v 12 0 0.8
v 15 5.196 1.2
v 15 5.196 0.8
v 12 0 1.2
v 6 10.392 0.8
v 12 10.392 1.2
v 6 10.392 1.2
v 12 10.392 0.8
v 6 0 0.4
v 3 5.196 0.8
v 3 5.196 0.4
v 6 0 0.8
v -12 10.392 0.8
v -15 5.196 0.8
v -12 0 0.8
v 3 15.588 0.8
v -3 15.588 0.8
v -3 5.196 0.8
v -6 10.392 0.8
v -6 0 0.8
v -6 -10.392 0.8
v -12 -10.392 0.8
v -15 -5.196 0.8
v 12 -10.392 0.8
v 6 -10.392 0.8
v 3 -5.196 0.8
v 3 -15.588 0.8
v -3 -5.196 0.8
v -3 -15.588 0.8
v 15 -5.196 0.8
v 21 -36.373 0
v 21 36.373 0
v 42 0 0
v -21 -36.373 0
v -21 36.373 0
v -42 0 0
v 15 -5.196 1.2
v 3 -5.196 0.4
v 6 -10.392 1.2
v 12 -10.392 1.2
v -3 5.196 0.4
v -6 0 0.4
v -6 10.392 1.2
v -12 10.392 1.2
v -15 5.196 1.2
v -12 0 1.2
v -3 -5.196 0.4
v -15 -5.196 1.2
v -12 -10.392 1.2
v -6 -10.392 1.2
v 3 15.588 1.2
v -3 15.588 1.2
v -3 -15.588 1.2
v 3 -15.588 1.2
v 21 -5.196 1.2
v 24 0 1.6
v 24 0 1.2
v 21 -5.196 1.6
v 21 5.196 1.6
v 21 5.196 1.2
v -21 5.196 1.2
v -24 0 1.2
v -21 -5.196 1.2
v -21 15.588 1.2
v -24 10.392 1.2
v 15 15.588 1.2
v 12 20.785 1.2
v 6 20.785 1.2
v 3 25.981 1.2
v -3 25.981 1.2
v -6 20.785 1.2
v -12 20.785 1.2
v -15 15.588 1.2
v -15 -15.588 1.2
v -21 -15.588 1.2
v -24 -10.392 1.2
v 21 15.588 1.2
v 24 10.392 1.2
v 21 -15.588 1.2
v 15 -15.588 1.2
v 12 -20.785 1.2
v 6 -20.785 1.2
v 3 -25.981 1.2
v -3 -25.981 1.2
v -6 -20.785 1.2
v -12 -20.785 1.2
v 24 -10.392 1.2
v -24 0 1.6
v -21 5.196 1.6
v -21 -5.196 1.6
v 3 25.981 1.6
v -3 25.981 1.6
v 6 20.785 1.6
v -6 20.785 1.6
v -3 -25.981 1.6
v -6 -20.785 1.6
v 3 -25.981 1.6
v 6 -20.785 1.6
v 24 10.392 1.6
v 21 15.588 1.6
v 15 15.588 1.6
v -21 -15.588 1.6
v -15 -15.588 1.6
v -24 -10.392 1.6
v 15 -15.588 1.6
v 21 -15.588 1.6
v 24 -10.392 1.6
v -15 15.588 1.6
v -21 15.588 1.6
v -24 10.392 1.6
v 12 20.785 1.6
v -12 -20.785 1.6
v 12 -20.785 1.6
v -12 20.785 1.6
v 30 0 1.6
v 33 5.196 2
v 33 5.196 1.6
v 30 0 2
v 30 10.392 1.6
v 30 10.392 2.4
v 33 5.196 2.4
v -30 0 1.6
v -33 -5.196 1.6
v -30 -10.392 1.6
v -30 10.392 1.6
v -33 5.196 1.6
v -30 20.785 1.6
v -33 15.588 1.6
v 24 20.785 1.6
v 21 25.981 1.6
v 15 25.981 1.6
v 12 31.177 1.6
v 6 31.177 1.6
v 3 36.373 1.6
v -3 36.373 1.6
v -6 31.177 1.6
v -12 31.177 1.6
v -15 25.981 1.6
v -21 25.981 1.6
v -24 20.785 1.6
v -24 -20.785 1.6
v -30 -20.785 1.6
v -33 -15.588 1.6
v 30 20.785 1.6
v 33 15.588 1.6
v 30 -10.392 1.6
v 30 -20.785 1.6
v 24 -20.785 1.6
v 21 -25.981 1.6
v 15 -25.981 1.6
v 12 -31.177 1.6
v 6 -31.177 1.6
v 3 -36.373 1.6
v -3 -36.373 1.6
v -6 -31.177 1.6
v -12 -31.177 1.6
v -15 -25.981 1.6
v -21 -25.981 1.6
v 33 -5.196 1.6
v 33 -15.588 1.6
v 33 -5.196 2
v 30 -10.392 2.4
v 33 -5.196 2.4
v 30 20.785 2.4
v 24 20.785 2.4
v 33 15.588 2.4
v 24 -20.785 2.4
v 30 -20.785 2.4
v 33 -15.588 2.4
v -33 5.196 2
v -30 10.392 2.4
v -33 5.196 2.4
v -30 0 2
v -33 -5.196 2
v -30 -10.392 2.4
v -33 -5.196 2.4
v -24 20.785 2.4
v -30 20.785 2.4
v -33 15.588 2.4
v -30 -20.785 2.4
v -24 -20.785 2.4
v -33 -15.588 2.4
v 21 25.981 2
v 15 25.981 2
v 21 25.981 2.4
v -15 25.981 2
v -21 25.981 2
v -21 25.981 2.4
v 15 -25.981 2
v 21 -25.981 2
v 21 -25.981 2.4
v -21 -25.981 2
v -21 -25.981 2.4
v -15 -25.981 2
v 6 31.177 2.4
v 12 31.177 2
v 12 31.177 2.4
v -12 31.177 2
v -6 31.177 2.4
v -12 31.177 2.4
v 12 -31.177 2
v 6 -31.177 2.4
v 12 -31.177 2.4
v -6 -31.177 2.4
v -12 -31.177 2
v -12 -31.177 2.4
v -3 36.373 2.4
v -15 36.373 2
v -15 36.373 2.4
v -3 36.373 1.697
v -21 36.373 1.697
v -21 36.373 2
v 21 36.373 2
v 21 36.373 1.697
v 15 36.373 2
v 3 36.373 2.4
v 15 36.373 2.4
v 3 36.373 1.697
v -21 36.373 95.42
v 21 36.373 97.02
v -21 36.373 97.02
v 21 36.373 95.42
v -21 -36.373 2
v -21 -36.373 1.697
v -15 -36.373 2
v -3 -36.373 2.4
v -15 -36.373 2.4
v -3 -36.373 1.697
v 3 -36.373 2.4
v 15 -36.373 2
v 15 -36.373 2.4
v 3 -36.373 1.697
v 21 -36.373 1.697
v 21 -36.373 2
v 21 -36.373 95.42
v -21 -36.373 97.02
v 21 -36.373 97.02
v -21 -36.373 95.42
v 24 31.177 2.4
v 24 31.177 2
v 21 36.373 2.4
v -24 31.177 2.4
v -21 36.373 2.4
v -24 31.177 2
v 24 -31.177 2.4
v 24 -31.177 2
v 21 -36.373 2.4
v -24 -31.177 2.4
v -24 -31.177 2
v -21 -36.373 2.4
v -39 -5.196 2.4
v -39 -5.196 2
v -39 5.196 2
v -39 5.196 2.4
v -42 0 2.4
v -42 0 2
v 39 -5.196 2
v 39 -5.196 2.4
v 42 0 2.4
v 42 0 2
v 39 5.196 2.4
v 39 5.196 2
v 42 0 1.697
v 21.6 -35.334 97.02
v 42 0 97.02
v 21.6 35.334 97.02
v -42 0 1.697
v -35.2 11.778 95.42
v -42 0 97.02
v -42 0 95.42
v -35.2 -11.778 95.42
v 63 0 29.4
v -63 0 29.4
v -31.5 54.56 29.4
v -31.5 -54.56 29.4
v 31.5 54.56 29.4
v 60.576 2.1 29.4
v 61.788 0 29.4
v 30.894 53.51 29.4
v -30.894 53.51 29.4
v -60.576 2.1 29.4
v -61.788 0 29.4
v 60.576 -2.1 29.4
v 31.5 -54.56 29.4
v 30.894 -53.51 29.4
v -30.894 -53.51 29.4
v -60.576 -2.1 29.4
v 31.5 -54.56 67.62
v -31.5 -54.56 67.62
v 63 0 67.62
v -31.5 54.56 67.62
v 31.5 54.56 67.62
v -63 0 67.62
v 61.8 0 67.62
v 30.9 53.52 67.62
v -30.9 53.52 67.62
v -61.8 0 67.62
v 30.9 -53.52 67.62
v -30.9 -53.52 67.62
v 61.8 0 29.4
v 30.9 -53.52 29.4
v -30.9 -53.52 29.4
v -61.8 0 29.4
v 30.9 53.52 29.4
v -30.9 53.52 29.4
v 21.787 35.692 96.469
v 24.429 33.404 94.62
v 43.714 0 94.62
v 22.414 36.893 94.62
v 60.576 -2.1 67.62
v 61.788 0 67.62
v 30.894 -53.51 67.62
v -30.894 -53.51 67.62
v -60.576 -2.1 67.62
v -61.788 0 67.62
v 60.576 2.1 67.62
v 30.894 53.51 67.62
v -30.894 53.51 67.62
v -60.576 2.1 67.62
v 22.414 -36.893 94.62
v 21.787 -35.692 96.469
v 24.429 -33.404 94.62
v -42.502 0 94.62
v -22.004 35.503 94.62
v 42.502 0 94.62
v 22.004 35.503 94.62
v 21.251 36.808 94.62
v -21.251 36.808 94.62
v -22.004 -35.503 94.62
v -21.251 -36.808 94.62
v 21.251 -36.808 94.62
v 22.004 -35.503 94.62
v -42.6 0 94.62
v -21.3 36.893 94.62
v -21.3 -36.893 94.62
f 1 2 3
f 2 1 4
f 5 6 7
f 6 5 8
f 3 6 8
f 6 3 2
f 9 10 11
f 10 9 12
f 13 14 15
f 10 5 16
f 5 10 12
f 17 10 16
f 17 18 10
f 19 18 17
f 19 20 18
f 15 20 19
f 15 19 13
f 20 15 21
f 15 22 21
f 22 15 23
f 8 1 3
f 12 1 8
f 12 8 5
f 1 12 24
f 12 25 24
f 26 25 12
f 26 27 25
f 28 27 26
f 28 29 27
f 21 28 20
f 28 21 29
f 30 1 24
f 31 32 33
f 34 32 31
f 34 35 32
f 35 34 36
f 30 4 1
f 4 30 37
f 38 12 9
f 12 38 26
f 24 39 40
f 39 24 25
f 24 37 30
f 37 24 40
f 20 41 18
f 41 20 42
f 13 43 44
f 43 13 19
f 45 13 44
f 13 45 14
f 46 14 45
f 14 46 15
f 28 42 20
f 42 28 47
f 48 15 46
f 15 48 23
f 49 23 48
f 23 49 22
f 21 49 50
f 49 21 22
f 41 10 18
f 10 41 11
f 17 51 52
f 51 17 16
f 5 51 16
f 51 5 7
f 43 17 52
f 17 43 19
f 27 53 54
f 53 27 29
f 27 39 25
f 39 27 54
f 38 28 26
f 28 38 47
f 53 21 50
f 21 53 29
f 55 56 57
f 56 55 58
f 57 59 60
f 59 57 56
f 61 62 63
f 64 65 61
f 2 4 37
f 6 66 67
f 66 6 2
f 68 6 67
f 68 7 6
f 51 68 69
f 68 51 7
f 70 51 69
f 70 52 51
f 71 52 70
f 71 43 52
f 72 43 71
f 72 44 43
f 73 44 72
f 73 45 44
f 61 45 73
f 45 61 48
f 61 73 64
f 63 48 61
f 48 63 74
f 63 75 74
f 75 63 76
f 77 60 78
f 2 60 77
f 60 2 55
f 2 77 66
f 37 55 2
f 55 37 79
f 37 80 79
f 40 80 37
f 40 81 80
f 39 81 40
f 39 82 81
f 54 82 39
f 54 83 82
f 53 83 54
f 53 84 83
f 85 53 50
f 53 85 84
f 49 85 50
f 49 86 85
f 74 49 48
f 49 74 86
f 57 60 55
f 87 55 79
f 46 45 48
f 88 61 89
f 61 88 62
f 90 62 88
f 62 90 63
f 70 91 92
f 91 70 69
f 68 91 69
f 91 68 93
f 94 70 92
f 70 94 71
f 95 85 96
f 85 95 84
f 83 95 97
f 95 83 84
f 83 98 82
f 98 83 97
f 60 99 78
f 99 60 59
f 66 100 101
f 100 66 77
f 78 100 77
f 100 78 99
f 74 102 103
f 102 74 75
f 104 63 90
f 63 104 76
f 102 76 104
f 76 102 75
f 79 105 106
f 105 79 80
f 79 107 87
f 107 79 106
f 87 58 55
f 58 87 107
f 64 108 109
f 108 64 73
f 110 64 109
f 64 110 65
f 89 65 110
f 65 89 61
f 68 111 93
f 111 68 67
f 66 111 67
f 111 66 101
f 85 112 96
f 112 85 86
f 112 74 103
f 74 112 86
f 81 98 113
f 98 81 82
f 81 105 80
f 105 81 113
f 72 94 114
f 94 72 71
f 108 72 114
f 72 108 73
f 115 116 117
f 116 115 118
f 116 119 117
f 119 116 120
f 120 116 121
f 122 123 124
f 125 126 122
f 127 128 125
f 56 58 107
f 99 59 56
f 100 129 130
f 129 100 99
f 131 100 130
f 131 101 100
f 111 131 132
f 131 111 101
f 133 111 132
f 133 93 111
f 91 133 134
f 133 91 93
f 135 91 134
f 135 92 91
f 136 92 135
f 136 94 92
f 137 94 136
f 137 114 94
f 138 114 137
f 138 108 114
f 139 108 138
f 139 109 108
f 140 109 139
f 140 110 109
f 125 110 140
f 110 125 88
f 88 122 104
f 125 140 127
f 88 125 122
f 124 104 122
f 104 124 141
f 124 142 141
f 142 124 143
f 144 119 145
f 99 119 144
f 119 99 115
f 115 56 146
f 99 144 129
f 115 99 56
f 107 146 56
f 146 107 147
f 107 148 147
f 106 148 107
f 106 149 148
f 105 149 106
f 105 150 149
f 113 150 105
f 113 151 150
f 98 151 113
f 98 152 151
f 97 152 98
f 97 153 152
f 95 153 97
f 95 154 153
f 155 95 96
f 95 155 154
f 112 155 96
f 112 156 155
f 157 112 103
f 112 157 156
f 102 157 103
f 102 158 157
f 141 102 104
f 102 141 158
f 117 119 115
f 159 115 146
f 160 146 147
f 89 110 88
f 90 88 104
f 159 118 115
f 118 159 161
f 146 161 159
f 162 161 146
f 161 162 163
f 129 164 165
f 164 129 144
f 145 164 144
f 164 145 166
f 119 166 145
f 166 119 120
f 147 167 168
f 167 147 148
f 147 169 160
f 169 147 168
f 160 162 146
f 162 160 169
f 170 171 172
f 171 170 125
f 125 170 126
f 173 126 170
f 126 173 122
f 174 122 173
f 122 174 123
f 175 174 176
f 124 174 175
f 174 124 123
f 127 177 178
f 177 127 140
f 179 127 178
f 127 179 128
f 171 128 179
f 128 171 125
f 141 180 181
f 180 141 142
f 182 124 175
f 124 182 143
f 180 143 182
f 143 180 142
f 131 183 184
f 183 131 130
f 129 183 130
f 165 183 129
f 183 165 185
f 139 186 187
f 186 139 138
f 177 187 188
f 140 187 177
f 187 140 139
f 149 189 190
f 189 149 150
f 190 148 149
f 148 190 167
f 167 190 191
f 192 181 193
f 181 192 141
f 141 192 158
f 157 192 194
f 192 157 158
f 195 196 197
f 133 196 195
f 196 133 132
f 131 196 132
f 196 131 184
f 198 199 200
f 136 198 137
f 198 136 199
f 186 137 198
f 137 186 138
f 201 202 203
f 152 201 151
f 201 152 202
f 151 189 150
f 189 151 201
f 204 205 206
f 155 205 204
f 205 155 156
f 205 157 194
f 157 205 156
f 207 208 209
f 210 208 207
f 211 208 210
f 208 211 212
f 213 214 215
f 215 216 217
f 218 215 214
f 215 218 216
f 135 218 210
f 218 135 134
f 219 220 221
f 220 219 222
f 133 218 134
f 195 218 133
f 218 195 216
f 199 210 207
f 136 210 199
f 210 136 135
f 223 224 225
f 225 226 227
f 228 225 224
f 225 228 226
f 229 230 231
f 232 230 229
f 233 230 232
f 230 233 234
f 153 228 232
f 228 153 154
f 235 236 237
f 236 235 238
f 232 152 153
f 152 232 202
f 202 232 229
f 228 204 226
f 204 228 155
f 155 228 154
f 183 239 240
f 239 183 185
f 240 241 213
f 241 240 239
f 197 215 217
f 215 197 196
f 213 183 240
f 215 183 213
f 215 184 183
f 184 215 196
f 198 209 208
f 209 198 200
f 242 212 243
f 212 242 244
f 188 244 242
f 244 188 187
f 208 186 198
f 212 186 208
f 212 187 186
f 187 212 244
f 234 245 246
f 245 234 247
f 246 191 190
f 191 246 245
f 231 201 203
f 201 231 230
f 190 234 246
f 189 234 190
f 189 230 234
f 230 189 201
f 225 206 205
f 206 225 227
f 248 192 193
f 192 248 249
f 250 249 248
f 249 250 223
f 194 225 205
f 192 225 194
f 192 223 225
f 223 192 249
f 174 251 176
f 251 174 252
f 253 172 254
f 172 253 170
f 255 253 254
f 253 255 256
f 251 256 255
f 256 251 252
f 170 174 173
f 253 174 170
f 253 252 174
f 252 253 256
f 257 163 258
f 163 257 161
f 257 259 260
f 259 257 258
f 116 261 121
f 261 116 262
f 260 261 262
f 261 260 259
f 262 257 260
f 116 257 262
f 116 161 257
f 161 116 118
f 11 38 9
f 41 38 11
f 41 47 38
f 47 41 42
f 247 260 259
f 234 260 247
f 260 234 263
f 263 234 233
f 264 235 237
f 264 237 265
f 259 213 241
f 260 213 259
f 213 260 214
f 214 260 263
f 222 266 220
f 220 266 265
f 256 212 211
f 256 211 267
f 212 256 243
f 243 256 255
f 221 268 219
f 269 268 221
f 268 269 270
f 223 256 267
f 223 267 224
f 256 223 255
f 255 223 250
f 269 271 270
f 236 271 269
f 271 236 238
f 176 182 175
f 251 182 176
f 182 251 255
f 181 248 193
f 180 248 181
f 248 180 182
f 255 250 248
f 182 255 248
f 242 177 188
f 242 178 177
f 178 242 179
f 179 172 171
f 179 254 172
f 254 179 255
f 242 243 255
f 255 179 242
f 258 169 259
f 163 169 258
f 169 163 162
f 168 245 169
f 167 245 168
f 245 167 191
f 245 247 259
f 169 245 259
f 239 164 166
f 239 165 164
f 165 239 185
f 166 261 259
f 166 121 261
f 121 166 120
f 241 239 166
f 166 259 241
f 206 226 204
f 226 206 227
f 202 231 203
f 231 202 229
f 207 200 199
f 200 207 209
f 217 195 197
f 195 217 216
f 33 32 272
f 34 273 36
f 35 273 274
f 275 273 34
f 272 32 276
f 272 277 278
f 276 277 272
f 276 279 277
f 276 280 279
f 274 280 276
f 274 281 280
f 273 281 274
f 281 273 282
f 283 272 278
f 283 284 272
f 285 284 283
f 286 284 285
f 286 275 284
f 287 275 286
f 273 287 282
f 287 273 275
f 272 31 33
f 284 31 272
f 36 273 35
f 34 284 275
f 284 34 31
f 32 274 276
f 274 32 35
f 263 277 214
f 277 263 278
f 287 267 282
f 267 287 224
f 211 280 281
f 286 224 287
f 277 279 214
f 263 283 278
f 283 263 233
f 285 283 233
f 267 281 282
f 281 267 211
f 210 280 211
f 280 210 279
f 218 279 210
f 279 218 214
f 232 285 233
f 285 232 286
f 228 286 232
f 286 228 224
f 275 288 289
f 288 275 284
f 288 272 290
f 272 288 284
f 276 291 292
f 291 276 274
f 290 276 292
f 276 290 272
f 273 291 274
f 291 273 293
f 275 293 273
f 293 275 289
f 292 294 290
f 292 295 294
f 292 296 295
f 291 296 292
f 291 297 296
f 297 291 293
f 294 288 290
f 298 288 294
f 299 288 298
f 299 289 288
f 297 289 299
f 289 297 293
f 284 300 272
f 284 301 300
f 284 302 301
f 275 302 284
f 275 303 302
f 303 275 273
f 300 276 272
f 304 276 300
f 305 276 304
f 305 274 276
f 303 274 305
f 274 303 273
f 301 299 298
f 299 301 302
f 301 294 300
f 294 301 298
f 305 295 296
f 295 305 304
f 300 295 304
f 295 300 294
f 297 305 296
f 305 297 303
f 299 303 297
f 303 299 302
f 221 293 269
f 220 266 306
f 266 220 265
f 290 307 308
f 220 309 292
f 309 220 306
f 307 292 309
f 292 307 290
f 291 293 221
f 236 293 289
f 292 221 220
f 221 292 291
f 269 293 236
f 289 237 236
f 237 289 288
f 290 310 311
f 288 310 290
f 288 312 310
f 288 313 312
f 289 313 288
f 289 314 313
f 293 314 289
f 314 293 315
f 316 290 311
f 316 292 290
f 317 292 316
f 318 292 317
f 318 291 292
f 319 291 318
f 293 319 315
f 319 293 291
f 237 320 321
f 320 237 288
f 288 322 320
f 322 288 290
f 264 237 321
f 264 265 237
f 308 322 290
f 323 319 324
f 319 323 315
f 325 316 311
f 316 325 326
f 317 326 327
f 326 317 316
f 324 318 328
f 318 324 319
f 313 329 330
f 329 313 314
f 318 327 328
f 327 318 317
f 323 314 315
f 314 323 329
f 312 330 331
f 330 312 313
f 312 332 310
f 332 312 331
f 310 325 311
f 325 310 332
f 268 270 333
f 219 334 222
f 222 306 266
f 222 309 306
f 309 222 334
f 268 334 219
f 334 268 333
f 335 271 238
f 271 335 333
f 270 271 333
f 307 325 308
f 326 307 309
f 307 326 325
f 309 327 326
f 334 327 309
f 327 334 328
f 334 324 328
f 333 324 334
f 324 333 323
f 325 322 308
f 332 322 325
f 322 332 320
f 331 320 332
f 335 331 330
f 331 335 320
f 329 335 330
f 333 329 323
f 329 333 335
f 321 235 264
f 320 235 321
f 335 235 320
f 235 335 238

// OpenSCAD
// this is the LH you want to print
layerHeight = 0.2;
// this is the minimum height of the bottom part
brightestHeight = 0.4;
// should be x*LH, you probably want to test your filament
brightStep = 2 * layerHeight;

//this controls the size of the lamp
smallHexR = 6;
wallThickness = 1.2;

//megic number
mn = 0.7;

//inner helpers 
f = sin(360/6);
newR = 7*smallHexR;


lamp();
//lid();

module lamp() {
  tileLayers();
  sixthLayer();

  difference() {
     outerWall();
      cylinder(
        r = newR, 
        h= 1000, 
        $fn=6
        );
      lidCut();
  }
}

module lid() {
    translate([-2*layerHeight,0,3.3*mn*newR-2*wallThickness])  {
        cylinder(
            r1 = newR+wallThickness/2-layerHeight/2,
            r2 = newR-(wallThickness+2*layerHeight),
            h= 2*wallThickness, 
            $fn=6
            );
        translate([1*wallThickness,0,0]) cylinder(
            r1 = newR+wallThickness/2-layerHeight/2,
            r2 = newR-(wallThickness+2*layerHeight),
            h= 2*wallThickness, 
            $fn=6
            );
    }
}


module lidCut() {
    translate([0,0,3.3*mn*newR-2*wallThickness])  {
        cylinder(
            r1 = newR+wallThickness/2,
            r2 = newR-wallThickness,
            h= 2*wallThickness, 
            $fn=6
            );
        translate([newR/4,0,0]) cylinder(
            r1 = newR+wallThickness/2,
            r2 = newR-wallThickness,
            h= 2*wallThickness, 
            $fn=6
            );
        
    }
}


module outerWall() {
  newWH = brightestHeight+8*brightStep;
  difference() {
      cylinder(
        r1 = newR, 
        r2 = 1.5*newR, 
        h= newR*mn, 
        $fn=6
        );
      translate([0,0,sqrt(2)*wallThickness]) cylinder(
        r1 = newR, 
        r2 = 1.5*newR, 
        h= newR*mn, 
        $fn=6
        );
  };

  translate([0,0, newR*mn]) 
  difference() {
      cylinder(
        r = 1.5*newR, 
        h= newR*1.3*mn, 
        $fn=6
        );
      cylinder(
        r = 1.5*newR-wallThickness, 
        h= newR*1.3*mn, 
        $fn=6
        );
  };

  translate([0,0,2.3*mn*newR]) 
  difference() {
      cylinder(
        r1 = 1.5*newR, 
        r2 = newR, 
        h=  newR*mn, 
        $fn=6
        );
      translate([0,0,-sqrt(2)*wallThickness]) cylinder(
        r1 = 1.5*newR, 
        r2 = newR, 
        h=  newR*mn, 
        $fn=6
        );
  }
}

module tileLayers() {
    firstLayer();
    secondLayer();
    thirdLayer();
    fourthLayer();
    fifthLayer();
}

module sixthLayer() {
  difference() {
      cylinder(r = 7*smallHexR, h=brightestHeight+5*brightStep, $fn=6);
      scale([1,1,1000])  tileLayers();
  }
}

module firstLayer() {
cylinder(r = smallHexR, h=brightestHeight, $fn=6);
}
module secondLayer() {
translate([1.5*smallHexR, f*smallHexR, 0]) cylinder(r = smallHexR, h=brightestHeight+brightStep, $fn=6);
translate([1.5*smallHexR, -1*f*smallHexR, 0]) cylinder(r = smallHexR, h=brightestHeight+brightStep, $fn=6);

translate([-1.5*smallHexR, f*smallHexR, 0]) cylinder(r = smallHexR, h=brightestHeight+brightStep, $fn=6);
translate([-1.5*smallHexR, -1*f*smallHexR, 0]) cylinder(r = smallHexR, h=brightestHeight+brightStep, $fn=6);

translate([0, 2*f*smallHexR, 0]) cylinder(r = smallHexR, h=brightestHeight+brightStep, $fn=6);
translate([0, -2*f*smallHexR, 0]) cylinder(r = smallHexR, h=brightestHeight+brightStep, $fn=6);
}
module thirdLayer() {
translate([3*smallHexR, 0, 0]) cylinder(r = smallHexR, h=brightestHeight+2*brightStep, $fn=6);
translate([-3*smallHexR, 0, 0]) cylinder(r = smallHexR, h=brightestHeight+2*brightStep, $fn=6);
translate([0, 4*f*smallHexR, 0]) cylinder(r = smallHexR, h=brightestHeight+2*brightStep, $fn=6);
translate([0, -4*f*smallHexR, 0]) cylinder(r = smallHexR, h=brightestHeight+2*brightStep, $fn=6);
translate([3*smallHexR, 2*f*smallHexR, 0]) cylinder(r = smallHexR, h=brightestHeight+2*brightStep, $fn=6);
translate([-3*smallHexR, -2*f*smallHexR, 0]) cylinder(r = smallHexR, h=brightestHeight+2*brightStep, $fn=6);
translate([3*smallHexR, -2*f*smallHexR, 0]) cylinder(r = smallHexR, h=brightestHeight+2*brightStep, $fn=6);
translate([-3*smallHexR, 2*f*smallHexR, 0]) cylinder(r = smallHexR, h=brightestHeight+2*brightStep, $fn=6);
translate([1.5*smallHexR, 3*f*smallHexR, 0]) cylinder(r = smallHexR, h=brightestHeight+2*brightStep, $fn=6);
translate([-1.5*smallHexR, -3*f*smallHexR, 0]) cylinder(r = smallHexR, h=brightestHeight+2*brightStep, $fn=6);
translate([1.5*smallHexR, -3*f*smallHexR, 0]) cylinder(r = smallHexR, h=brightestHeight+2*brightStep, $fn=6);
translate([-1.5*smallHexR, 3*f*smallHexR, 0]) cylinder(r = smallHexR, h=brightestHeight+2*brightStep, $fn=6);
}
module fourthLayer() {
translate([4.5*smallHexR, 1*f*smallHexR, 0]) cylinder(r = smallHexR, h=brightestHeight+3*brightStep, $fn=6);
translate([4.5*smallHexR, -1*f*smallHexR, 0]) cylinder(r = smallHexR, h=brightestHeight+3*brightStep, $fn=6);
translate([4.5*smallHexR, 3*f*smallHexR, 0]) cylinder(r = smallHexR, h=brightestHeight+3*brightStep, $fn=6);
translate([4.5*smallHexR, -3*f*smallHexR, 0]) cylinder(r = smallHexR, h=brightestHeight+3*brightStep, $fn=6);
translate([-4.5*smallHexR, 1*f*smallHexR, 0]) cylinder(r = smallHexR, h=brightestHeight+3*brightStep, $fn=6);
translate([-4.5*smallHexR, -1*f*smallHexR, 0]) cylinder(r = smallHexR, h=brightestHeight+3*brightStep, $fn=6);
translate([-4.5*smallHexR, 3*f*smallHexR, 0]) cylinder(r = smallHexR, h=brightestHeight+3*brightStep, $fn=6);
translate([-4.5*smallHexR, -3*f*smallHexR, 0]) cylinder(r = smallHexR, h=brightestHeight+3*brightStep, $fn=6);

translate([3*smallHexR, 4*f*smallHexR, 0]) cylinder(r = smallHexR, h=brightestHeight+3*brightStep, $fn=6);
translate([-3*smallHexR, 4*f*smallHexR, 0]) cylinder(r = smallHexR, h=brightestHeight+3*brightStep, $fn=6);
translate([3*smallHexR, -4*f*smallHexR, 0]) cylinder(r = smallHexR, h=brightestHeight+3*brightStep, $fn=6);
translate([-3*smallHexR, -4*f*smallHexR, 0]) cylinder(r = smallHexR, h=brightestHeight+3*brightStep, $fn=6);

translate([1.5*smallHexR, 5*f*smallHexR, 0]) cylinder(r = smallHexR, h=brightestHeight+3*brightStep, $fn=6);
translate([-1.5*smallHexR, 5*f*smallHexR, 0]) cylinder(r = smallHexR, h=brightestHeight+3*brightStep, $fn=6);
translate([1.5*smallHexR, -5*f*smallHexR, 0]) cylinder(r = smallHexR, h=brightestHeight+3*brightStep, $fn=6);
translate([-1.5*smallHexR, -5*f*smallHexR, 0]) cylinder(r = smallHexR, h=brightestHeight+3*brightStep, $fn=6);

translate([0, 6*f*smallHexR, 0]) cylinder(r = smallHexR, h=brightestHeight+3*brightStep, $fn=6);
translate([0, -6*f*smallHexR, 0]) cylinder(r = smallHexR, h=brightestHeight+3*brightStep, $fn=6);
}
module fifthLayer() {
translate([3*smallHexR, 6*f*smallHexR, 0]) cylinder(r = smallHexR, h=brightestHeight+4*brightStep, $fn=6);
translate([-3*smallHexR, 6*f*smallHexR, 0]) cylinder(r = smallHexR, h=brightestHeight+4*brightStep, $fn=6);
translate([3*smallHexR, -6*f*smallHexR, 0]) cylinder(r = smallHexR, h=brightestHeight+4*brightStep, $fn=6);
translate([-3*smallHexR, -6*f*smallHexR, 0]) cylinder(r = smallHexR, h=brightestHeight+4*brightStep, $fn=6);
translate([-6*smallHexR, 0*f*smallHexR, 0]) cylinder(r = smallHexR, h=brightestHeight+4*brightStep, $fn=6);
translate([6*smallHexR, 0*f*smallHexR, 0]) cylinder(r = smallHexR, h=brightestHeight+4*brightStep, $fn=6);
}
   
